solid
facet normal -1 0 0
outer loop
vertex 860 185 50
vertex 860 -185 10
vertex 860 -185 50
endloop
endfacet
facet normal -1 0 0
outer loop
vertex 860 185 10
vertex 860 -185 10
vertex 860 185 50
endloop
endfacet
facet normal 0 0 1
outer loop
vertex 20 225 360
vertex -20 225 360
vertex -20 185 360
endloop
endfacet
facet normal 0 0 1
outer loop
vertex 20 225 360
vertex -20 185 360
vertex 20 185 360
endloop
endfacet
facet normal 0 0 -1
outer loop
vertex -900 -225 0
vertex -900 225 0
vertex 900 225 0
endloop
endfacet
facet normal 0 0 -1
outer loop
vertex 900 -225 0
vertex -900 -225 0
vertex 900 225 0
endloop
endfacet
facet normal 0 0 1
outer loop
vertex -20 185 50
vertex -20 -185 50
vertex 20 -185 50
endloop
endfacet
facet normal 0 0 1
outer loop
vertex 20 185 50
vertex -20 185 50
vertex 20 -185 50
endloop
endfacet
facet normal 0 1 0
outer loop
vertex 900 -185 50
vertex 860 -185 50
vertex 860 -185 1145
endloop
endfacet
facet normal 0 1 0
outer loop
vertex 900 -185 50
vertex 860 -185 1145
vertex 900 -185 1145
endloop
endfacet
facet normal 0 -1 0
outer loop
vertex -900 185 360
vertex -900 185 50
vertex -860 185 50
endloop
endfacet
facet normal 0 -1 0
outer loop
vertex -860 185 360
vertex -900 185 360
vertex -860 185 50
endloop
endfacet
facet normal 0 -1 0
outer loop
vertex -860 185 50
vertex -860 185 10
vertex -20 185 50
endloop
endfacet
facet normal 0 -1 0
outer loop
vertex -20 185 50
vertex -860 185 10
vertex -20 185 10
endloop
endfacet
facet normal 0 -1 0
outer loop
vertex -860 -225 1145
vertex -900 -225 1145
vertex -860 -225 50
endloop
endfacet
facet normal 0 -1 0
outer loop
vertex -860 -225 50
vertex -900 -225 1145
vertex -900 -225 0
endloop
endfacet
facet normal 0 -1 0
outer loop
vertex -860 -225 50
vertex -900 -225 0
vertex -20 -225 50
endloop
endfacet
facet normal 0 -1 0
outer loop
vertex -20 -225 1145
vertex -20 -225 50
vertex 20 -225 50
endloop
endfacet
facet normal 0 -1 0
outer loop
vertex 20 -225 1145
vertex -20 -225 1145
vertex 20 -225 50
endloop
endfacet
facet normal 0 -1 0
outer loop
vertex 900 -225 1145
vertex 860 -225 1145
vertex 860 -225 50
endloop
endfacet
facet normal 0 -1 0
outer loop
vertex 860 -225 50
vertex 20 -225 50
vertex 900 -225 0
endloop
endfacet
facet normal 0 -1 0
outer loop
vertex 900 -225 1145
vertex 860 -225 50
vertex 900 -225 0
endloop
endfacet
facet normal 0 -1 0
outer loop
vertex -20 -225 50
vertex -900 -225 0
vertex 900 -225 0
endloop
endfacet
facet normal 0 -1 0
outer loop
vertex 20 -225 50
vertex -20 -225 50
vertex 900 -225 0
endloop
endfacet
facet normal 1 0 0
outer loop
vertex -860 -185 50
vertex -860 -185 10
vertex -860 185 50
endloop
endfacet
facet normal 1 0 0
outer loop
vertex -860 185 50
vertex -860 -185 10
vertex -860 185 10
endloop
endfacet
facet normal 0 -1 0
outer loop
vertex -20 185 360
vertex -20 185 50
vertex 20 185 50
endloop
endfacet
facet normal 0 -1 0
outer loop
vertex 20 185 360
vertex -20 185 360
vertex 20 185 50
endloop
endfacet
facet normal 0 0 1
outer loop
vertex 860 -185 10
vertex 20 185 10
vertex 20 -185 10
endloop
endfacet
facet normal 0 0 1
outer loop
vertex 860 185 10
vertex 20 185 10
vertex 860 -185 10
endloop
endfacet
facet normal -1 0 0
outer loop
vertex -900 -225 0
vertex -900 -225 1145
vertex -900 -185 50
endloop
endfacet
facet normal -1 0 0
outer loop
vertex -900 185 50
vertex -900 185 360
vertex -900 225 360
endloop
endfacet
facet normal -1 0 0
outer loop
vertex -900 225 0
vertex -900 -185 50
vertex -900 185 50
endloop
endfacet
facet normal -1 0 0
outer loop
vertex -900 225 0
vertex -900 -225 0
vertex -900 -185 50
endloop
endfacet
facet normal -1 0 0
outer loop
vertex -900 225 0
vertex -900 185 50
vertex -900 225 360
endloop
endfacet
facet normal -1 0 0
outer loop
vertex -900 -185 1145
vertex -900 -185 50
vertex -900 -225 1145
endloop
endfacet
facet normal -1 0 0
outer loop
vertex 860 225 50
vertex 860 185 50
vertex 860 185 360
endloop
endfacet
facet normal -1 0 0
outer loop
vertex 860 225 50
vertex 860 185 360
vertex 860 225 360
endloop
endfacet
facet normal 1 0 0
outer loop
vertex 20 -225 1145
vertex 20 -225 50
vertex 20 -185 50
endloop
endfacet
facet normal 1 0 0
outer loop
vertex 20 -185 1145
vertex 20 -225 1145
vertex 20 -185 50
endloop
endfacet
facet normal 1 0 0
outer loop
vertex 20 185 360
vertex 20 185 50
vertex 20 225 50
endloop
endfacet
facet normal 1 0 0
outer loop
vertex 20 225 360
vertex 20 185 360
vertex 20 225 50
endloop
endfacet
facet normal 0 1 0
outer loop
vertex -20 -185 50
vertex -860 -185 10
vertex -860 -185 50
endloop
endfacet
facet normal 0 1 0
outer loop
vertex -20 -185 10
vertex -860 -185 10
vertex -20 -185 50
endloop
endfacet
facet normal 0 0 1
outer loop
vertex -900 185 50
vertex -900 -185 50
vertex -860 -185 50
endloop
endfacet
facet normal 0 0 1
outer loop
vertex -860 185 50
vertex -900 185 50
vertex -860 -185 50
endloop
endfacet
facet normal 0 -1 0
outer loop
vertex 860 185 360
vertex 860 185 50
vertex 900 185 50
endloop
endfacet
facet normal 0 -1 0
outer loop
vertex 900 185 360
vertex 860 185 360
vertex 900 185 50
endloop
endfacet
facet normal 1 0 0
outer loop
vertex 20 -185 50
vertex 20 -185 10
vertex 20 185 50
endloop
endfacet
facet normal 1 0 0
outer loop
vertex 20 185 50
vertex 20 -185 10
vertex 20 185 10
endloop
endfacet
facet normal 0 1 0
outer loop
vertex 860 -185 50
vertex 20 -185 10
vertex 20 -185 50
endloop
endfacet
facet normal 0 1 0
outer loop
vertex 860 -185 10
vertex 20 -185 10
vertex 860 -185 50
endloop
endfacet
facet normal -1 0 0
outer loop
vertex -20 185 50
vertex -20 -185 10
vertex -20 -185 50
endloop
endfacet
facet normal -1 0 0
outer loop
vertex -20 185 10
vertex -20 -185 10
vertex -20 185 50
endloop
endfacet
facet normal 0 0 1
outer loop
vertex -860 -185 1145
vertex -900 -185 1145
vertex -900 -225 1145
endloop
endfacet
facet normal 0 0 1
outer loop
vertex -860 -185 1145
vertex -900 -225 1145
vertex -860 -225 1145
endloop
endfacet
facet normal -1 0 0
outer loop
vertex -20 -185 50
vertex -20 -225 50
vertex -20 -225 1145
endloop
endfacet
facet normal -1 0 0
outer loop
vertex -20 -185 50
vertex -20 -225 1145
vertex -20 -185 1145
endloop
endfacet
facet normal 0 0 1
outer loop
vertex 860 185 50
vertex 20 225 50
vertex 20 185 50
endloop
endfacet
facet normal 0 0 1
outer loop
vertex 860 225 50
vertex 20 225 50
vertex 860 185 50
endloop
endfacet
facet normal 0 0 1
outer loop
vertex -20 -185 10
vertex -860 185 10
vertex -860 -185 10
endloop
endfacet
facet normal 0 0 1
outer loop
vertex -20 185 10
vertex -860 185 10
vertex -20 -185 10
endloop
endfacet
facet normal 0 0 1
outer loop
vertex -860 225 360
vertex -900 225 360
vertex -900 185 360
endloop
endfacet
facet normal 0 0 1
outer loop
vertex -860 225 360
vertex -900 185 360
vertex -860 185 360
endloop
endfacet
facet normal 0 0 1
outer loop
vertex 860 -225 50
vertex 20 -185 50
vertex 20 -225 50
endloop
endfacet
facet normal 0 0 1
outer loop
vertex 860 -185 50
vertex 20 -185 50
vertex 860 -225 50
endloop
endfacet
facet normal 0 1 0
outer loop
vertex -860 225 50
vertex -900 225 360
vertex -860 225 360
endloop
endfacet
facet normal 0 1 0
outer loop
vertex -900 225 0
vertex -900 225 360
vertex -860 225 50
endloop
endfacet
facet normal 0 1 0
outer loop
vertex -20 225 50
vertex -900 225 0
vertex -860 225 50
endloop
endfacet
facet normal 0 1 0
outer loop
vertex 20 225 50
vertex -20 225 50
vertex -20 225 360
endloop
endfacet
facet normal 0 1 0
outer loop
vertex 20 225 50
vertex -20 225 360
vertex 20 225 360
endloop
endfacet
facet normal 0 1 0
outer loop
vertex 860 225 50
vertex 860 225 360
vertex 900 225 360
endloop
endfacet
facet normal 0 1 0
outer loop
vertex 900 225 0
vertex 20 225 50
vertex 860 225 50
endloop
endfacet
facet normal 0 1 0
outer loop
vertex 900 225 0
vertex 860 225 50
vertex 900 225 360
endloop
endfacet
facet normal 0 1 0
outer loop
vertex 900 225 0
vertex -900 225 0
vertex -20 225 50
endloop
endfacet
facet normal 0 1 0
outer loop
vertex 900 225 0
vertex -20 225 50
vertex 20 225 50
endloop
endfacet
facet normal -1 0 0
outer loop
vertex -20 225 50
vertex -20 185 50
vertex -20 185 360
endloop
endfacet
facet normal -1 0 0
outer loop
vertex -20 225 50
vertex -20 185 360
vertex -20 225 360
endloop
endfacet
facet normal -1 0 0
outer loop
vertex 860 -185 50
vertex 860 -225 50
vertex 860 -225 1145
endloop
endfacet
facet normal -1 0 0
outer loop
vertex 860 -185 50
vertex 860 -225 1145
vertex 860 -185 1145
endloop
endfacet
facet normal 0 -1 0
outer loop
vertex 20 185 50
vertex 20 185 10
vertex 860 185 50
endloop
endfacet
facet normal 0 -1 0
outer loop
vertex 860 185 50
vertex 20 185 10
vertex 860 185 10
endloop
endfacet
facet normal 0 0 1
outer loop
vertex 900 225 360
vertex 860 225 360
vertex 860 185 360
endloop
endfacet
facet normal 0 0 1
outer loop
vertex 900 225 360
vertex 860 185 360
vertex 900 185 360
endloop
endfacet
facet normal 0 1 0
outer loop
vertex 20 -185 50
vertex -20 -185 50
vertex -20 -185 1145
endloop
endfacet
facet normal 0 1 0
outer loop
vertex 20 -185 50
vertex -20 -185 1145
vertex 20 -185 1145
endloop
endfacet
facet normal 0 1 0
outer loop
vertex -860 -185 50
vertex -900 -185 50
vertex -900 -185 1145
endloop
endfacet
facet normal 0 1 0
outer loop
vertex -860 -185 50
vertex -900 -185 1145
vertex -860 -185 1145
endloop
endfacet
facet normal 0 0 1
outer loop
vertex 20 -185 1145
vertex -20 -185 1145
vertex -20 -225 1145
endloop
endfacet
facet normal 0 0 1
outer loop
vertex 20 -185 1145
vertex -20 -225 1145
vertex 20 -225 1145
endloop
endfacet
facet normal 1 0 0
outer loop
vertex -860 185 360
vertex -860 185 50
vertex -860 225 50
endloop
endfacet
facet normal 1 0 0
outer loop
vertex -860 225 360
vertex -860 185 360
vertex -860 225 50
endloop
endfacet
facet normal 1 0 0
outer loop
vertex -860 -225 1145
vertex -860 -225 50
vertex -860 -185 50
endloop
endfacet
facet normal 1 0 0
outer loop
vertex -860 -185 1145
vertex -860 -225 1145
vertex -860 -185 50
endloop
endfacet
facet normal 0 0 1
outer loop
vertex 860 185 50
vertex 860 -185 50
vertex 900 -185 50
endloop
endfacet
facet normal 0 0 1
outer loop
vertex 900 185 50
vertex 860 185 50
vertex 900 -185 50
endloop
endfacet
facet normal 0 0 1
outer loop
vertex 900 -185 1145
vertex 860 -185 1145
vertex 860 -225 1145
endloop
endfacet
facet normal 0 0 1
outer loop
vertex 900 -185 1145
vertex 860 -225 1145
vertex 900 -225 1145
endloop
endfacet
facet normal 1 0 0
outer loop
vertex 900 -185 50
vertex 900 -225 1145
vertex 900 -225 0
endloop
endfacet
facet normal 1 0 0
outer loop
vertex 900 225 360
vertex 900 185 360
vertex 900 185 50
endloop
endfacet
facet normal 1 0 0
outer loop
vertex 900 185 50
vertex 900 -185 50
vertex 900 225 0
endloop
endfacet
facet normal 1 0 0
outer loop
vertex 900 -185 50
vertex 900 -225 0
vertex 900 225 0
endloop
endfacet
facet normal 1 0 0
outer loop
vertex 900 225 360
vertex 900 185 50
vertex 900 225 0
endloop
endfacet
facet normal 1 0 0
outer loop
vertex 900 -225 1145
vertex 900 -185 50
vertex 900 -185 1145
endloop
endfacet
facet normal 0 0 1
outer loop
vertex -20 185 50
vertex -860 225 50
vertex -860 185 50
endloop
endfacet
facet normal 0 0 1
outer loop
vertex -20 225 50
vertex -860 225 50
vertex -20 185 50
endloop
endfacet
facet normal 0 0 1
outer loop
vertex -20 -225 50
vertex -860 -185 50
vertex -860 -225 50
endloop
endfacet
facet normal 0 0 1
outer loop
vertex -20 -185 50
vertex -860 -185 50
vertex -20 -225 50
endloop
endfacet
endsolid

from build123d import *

# Parameters (mm, degrees)
F0_W      = 1800
F0_H      = 450
F1_DEPTH  = 10
F2_W      = 40
F2_H      = 450
F3_DEPTH  = 40
F4_W      = 40
F4_H      = 450
F5_DEPTH  = 40
F6_W      = 40
F6_H      = 370
F7_DEPTH  = 40
F8_W      = 1720
F8_H      = 40
F9_DEPTH  = 40
F10_W     = 1720
F10_H     = 40
F11_DEPTH = 40
F12_W     = 40
F12_H     = 40
F13_DEPTH = 1095
F14_W     = 40
F14_H     = 40
F15_DEPTH = 1095
F16_W     = 40
F16_H     = 40
F17_DEPTH = 1095
F18_W     = 40
F18_H     = 40
F19_DEPTH = 310
F20_W     = 40
F20_H     = 40
F21_DEPTH = 310
F22_W     = 40
F22_H     = 40
F23_DEPTH = 310


with BuildPart() as f1:
    # F0 (on Top) → F1 (new body)
    with BuildSketch(Plane.XY):
        Rectangle(F0_W, F0_H)
    extrude(amount=F1_DEPTH)

    # F2 (on face) → F3 (join)
    with BuildSketch(Plane.XY.offset(10)):
        with Locations((-880, 0)):
            Rectangle(F2_W, F2_H)
    extrude(amount=F3_DEPTH)

    # F4 (on face) → F5 (join)
    with BuildSketch(Plane.XY.offset(10)):
        with Locations((880, 0)):
            Rectangle(F4_W, F4_H)
    extrude(amount=F5_DEPTH)

    # F6 (on face) → F7 (join)
    with BuildSketch(Plane.XY.offset(10)):
        Rectangle(F6_W, F6_H)
    extrude(amount=F7_DEPTH)

    # F8 (on face) → F9 (join)
    with BuildSketch(Plane.XY.offset(10)):
        with Locations((0, -205)):
            Rectangle(F8_W, F8_H)
    extrude(amount=F9_DEPTH)

    # F10 (on face) → F11 (join)
    with BuildSketch(Plane.XY.offset(10)):
        with Locations((0, 205)):
            Rectangle(F10_W, F10_H)
    extrude(amount=F11_DEPTH)

    # F12 (on face) → F13 (join)
    with BuildSketch(Plane.XY.offset(50)):
        with Locations((-880, -205)):
            Rectangle(F12_W, F12_H)
    extrude(amount=F13_DEPTH)

    # F14 (on face) → F15 (join)
    with BuildSketch(Plane.XY.offset(50)):
        with Locations((0, -205)):
            Rectangle(F14_W, F14_H)
    extrude(amount=F15_DEPTH)

    # F16 (on face) → F17 (join)
    with BuildSketch(Plane.XY.offset(50)):
        with Locations((880, -205)):
            Rectangle(F16_W, F16_H)
    extrude(amount=F17_DEPTH)

    # F18 (on face) → F19 (join)
    with BuildSketch(Plane.XY.offset(50)):
        with Locations((-880, 205)):
            Rectangle(F18_W, F18_H)
    extrude(amount=F19_DEPTH)

    # F20 (on face) → F21 (join)
    with BuildSketch(Plane.XY.offset(50)):
        with Locations((0, 205)):
            Rectangle(F20_W, F20_H)
    extrude(amount=F21_DEPTH)

    # F22 (on face) → F23 (join)
    with BuildSketch(Plane.XY.offset(50)):
        with Locations((880, 205)):
            Rectangle(F22_W, F22_H)
    extrude(amount=F23_DEPTH)


solid = f1.part
